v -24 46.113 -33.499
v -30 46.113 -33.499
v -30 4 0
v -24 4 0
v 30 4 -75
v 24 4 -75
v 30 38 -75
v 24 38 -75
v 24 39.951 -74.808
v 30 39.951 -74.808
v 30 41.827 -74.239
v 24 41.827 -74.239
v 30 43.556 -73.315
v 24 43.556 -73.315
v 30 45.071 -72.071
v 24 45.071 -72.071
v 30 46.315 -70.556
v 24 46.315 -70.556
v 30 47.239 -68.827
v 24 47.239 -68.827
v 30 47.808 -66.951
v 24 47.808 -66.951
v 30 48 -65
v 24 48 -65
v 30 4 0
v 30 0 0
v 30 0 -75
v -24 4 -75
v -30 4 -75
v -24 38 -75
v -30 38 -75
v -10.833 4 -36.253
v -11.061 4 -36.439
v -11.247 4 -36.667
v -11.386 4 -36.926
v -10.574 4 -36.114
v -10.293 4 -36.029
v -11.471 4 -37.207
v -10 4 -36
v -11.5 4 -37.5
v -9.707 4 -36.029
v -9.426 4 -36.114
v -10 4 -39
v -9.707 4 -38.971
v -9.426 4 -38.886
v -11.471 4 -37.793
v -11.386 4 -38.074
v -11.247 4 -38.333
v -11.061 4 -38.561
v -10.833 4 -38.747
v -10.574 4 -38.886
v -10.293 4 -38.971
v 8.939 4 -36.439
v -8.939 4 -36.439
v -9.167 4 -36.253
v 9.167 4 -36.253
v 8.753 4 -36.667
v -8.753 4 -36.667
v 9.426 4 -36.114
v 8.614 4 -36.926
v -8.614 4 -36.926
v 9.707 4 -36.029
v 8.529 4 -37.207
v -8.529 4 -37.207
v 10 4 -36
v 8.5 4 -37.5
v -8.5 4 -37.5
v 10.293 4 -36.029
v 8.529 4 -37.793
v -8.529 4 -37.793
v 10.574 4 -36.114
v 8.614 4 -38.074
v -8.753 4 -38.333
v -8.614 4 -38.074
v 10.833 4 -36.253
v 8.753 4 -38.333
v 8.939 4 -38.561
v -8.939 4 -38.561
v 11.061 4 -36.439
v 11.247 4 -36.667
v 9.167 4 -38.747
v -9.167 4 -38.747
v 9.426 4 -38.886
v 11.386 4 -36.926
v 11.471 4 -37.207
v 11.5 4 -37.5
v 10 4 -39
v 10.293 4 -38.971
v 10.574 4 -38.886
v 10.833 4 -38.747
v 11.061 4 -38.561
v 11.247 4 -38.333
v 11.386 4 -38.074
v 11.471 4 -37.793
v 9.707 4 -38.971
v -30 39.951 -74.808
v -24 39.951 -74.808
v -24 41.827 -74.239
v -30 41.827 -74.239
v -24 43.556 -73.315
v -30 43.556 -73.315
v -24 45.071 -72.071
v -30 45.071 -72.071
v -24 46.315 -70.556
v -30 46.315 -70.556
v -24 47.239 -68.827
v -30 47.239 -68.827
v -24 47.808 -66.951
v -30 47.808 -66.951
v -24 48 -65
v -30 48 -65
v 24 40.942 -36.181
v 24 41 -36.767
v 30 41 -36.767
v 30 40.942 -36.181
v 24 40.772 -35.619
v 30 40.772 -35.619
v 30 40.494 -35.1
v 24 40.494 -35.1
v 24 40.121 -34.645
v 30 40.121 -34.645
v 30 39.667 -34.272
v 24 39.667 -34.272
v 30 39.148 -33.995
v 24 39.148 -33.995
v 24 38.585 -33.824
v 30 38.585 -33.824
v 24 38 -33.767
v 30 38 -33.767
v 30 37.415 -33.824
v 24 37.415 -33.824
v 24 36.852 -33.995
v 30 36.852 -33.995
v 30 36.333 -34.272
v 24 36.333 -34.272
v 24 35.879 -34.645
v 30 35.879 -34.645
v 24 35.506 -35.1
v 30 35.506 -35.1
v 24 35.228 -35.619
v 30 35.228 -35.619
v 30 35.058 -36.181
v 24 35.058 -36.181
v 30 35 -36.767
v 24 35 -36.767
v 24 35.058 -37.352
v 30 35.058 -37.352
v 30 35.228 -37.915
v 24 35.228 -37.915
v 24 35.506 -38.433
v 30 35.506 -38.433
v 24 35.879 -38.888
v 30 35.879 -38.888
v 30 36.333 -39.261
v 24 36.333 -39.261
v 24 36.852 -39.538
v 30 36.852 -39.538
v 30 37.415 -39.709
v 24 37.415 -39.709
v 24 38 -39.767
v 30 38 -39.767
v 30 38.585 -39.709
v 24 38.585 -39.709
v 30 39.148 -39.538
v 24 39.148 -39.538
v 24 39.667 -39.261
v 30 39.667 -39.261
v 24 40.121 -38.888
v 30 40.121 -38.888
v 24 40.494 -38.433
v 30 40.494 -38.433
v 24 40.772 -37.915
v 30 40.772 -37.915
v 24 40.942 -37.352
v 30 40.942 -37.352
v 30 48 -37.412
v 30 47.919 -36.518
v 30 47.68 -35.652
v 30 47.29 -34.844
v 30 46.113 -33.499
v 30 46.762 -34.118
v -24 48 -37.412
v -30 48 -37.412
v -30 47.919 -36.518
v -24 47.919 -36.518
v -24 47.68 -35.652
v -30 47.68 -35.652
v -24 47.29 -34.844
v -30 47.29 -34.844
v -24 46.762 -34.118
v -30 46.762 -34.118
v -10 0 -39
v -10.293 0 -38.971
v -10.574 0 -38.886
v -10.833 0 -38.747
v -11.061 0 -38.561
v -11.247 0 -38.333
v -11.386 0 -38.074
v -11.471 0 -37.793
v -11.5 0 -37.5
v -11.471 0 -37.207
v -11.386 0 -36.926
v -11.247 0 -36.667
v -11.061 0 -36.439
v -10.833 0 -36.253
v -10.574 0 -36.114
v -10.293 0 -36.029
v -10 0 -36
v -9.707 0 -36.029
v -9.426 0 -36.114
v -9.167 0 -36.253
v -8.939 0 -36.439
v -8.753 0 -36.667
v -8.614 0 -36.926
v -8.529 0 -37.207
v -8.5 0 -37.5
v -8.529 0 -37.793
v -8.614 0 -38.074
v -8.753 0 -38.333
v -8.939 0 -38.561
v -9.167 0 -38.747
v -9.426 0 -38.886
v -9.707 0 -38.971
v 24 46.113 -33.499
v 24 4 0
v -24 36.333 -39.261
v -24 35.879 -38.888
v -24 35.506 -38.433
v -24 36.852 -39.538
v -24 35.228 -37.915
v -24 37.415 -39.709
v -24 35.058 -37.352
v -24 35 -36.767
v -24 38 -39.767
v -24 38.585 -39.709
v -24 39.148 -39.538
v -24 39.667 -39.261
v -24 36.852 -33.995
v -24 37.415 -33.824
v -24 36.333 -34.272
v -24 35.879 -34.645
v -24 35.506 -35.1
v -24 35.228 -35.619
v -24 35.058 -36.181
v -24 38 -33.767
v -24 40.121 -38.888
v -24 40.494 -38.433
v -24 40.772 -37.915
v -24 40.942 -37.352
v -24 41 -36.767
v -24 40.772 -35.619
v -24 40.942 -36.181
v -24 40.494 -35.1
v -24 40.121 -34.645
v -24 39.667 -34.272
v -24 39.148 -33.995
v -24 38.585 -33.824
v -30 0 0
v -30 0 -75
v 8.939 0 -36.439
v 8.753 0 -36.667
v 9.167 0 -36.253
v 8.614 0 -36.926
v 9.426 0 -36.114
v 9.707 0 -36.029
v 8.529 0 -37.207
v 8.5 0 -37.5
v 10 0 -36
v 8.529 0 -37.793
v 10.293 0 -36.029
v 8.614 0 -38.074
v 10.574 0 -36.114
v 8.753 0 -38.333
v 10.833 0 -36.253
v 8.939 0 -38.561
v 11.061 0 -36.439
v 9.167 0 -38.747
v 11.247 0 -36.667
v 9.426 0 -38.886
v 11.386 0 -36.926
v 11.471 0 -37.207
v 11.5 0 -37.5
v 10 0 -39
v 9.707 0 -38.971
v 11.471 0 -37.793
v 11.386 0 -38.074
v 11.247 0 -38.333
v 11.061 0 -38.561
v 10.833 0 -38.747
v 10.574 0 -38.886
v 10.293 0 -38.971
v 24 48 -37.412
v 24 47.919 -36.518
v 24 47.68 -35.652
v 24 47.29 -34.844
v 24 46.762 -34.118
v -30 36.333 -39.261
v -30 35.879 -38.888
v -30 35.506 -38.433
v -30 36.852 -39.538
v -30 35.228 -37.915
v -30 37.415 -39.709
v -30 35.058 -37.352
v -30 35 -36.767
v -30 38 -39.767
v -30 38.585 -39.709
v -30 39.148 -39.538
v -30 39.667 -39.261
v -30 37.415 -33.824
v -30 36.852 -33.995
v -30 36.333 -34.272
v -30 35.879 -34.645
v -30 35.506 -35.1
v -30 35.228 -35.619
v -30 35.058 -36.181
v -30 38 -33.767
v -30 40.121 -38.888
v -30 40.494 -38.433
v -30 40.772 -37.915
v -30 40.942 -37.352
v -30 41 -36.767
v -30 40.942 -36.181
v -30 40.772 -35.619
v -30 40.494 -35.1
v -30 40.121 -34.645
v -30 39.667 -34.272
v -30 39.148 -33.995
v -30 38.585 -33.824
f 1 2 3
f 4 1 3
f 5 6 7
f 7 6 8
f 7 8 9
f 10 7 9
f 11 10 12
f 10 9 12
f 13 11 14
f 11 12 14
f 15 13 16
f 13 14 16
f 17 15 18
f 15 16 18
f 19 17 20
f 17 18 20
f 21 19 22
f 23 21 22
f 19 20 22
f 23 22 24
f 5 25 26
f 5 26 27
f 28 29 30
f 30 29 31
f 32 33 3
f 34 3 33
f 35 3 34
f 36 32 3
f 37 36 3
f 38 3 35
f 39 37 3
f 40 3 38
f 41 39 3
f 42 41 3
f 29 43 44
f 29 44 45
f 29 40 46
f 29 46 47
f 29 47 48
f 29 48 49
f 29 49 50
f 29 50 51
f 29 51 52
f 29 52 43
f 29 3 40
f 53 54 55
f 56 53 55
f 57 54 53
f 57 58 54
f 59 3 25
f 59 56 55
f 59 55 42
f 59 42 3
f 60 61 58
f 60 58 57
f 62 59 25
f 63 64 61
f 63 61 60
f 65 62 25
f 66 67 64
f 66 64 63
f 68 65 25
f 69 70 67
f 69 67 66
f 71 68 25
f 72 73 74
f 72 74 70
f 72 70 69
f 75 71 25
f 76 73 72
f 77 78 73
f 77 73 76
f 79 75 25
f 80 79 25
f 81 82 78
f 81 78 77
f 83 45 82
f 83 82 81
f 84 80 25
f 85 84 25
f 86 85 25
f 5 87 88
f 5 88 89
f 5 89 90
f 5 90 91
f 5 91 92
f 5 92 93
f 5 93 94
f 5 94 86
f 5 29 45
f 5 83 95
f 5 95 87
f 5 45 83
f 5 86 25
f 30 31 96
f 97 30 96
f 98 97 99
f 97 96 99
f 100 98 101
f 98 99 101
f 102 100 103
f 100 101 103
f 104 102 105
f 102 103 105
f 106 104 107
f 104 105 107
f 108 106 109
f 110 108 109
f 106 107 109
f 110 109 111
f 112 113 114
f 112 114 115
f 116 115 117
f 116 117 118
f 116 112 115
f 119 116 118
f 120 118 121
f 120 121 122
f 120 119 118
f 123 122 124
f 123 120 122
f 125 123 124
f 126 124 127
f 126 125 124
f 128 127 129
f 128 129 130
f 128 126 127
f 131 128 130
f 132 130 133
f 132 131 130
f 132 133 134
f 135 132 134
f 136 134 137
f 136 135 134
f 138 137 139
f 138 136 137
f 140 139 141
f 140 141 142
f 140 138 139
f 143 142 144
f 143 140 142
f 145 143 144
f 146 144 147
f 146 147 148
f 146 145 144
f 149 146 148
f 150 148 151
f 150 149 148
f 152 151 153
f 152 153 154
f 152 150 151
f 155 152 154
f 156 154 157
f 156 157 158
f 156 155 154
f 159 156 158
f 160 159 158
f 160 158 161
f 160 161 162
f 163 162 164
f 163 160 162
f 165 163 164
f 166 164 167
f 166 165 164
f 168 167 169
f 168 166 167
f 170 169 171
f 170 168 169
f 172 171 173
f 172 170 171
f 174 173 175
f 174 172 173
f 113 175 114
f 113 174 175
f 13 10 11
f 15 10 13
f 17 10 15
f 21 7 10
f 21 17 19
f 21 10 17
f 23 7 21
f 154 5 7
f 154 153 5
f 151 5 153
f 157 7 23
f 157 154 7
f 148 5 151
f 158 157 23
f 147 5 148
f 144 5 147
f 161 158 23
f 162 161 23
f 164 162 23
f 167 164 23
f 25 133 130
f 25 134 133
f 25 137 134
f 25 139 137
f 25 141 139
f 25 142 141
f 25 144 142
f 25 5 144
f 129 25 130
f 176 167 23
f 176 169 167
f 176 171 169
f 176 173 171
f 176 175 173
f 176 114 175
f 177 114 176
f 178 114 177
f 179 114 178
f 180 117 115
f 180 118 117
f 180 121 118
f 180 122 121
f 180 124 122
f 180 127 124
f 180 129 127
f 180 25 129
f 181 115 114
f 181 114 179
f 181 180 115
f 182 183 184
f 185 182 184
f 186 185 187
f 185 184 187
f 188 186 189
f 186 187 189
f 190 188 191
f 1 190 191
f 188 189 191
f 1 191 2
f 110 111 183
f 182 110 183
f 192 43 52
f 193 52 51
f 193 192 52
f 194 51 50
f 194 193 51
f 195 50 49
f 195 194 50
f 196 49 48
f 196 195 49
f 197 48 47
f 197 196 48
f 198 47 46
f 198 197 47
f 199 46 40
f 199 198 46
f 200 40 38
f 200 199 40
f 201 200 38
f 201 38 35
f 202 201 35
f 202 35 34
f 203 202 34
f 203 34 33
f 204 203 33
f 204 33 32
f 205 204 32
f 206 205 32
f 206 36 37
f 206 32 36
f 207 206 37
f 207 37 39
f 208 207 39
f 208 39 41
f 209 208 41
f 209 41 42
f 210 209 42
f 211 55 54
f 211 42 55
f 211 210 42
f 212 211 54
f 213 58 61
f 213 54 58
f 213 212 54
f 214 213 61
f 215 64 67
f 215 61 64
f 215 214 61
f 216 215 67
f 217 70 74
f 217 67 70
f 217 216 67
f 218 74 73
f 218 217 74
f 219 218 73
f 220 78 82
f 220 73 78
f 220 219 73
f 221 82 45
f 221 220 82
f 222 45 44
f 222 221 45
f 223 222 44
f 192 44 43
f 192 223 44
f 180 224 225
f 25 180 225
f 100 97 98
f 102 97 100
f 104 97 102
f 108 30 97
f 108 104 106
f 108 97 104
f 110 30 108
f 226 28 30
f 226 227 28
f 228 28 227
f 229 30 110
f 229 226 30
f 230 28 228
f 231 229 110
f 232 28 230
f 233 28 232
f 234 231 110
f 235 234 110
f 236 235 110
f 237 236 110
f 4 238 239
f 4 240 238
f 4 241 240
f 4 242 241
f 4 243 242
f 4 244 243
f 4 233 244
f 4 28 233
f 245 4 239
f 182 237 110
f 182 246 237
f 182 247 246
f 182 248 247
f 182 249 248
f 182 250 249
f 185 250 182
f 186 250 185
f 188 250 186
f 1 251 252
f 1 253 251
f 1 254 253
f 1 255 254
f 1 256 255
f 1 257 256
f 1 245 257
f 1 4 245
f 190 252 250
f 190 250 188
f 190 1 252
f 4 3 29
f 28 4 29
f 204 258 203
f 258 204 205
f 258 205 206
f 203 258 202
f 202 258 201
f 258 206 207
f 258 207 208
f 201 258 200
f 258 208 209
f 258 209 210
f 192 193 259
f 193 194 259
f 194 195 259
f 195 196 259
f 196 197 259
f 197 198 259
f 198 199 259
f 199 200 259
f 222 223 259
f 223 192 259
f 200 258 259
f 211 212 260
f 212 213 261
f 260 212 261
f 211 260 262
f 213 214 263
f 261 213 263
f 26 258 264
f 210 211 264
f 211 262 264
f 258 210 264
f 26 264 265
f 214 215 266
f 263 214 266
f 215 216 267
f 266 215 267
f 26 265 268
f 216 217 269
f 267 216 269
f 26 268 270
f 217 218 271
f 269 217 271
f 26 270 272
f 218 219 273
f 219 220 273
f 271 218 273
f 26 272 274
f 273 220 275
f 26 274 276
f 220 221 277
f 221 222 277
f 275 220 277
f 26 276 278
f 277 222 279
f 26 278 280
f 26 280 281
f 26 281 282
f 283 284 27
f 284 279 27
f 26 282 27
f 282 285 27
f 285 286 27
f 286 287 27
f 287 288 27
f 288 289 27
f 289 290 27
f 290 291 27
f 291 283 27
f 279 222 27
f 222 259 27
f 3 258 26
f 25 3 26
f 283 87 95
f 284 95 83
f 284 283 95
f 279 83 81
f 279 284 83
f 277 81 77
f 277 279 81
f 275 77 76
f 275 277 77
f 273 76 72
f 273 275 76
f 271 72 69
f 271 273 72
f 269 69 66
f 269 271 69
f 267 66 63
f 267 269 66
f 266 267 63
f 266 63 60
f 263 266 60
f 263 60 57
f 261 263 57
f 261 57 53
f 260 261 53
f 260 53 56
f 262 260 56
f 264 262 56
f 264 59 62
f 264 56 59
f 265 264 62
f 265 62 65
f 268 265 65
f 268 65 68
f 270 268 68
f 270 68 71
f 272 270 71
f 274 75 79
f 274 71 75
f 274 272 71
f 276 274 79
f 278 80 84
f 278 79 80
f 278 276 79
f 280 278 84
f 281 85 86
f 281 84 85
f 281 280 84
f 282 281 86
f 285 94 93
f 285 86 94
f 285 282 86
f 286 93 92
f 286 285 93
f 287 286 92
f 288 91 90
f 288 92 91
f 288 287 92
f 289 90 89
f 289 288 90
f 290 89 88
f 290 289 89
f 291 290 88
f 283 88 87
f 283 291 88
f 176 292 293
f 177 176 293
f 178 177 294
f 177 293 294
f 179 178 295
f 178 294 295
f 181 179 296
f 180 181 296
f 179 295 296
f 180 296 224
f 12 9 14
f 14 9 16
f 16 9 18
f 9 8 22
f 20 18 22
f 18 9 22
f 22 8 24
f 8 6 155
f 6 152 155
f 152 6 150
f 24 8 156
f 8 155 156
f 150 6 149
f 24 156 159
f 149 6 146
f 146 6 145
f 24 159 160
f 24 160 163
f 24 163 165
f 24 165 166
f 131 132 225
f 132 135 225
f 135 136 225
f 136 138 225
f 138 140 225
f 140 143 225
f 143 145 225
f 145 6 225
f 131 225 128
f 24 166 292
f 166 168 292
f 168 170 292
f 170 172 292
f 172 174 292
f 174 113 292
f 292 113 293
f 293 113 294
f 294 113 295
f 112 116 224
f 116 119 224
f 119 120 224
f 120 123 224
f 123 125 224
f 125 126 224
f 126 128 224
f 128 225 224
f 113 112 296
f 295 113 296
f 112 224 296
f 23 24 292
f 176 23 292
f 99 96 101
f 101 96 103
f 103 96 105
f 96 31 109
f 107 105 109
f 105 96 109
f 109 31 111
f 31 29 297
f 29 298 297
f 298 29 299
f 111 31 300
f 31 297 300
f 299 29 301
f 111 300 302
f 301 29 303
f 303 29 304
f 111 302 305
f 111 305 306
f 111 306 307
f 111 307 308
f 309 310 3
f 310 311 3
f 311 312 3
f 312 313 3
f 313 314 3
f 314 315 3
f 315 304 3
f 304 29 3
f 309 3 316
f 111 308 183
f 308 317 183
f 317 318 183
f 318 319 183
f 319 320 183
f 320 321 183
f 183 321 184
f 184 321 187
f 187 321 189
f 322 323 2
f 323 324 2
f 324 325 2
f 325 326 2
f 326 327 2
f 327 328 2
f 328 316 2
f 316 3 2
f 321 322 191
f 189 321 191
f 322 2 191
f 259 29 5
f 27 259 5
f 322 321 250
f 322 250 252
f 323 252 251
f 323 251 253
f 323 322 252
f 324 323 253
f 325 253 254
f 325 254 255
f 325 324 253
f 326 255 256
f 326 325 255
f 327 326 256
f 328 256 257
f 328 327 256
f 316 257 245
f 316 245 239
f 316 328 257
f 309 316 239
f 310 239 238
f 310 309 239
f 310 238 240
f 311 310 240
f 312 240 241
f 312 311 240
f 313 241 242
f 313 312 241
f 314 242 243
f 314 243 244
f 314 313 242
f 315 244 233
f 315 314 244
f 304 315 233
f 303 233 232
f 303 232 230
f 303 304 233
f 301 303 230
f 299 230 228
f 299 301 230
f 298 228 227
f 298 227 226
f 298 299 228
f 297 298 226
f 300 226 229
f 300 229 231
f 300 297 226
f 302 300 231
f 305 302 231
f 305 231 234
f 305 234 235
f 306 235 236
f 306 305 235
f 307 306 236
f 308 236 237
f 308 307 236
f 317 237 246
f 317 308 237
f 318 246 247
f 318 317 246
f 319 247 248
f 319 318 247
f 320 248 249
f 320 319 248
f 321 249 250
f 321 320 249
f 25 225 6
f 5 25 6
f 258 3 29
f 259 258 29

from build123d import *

# Parameters (mm, degrees)
SKETCH1_W               = 60
SKETCH1_H               = 75
BOSS_EXTRUDE1_DEPTH     = 4
CUT_EXTRUDE1_DEPTH      = 81.876448982
CUT_EXTRUDE1_DEPTH_BACK = 4
SKETCH2_R               = 1.5
SKETCH8_R               = 3
CUT_EXTRUDE2_DEPTH      = 74
FILLET3_R               = 5
FILLET4_R               = 10
SPLIT1_START            = 4
SPLIT1_OUTLINE_W        = 6
SPLIT1_OUTLINE_H        = 76
SPLIT1_DEPTH            = 44
SPLIT1_START_2          = -30
SPLIT1_2_OUTLINE_R      = 3
SPLIT1_2_DEPTH          = 6
SPLIT1_START_3          = 24
SPLIT1_3_OUTLINE_R      = 3
SPLIT1_3_DEPTH          = 6


# Read off the part's stored shape, not the designer's step: Split1
with BuildPart() as part:
    # Sketch1 → Boss-Extrude1 (new body)
    with BuildSketch(Plane(origin=(0, 0, 0), x_dir=(1, 0, 0), z_dir=(0, 1, 0))):
        with Locations((0, 37.5)):
            Rectangle(SKETCH1_W, SKETCH1_H)
    extrude(amount=BOSS_EXTRUDE1_DEPTH)

    # Sketch2 → Cut-Extrude1 (cut, two sides: drawn at the far end of the back side and taken through both)
    with BuildSketch(Plane(origin=(0, 4, 0), x_dir=(1, 0, 0), z_dir=(0, 1, 0)).offset(-CUT_EXTRUDE1_DEPTH_BACK)):
        with Locations(Location((-10, 37.5, 0), (0, 0, 90))):
            Circle(SKETCH2_R)
        with Locations(Location((10, 37.5, 0), (0, 0, 90))):
            Circle(SKETCH2_R)
    extrude(amount=CUT_EXTRUDE1_DEPTH + CUT_EXTRUDE1_DEPTH_BACK, mode=Mode.SUBTRACT)

    # Sketch3 → Loft1 section 0
    with BuildSketch(Plane(origin=(0, 4, 0), x_dir=(1, 0, 0), z_dir=(0, 1, 0))):
        with BuildLine():
            Line((30, 75), (24, 75))
            Line((24, 75), (24, 0))
            Line((24, 0), (30, 0))
            Line((30, 0), (30, 75))
        make_face()
    # Sketch4 → Loft1 section 1
    with BuildSketch(Plane(origin=(0, 48, 0), x_dir=(1, 0, 0), z_dir=(0, 1, 0))):
        with BuildLine():
            Line((24, 75), (24, 35))
            Line((24, 35), (30, 35))
            Line((30, 35), (30, 75))
            Line((30, 75), (24, 75))
        make_face()
    loft()

    # Sketch3<19> → Loft2 section 0
    with BuildSketch(Plane(origin=(0, 4, 0), x_dir=(1, 0, 0), z_dir=(0, 1, 0))):
        with BuildLine():
            Line((-30, 75), (-24, 75))
            Line((-24, 75), (-24, 0))
            Line((-24, 0), (-30, 0))
            Line((-30, 0), (-30, 75))
        make_face()
    # Sketch4<17> → Loft2 section 1
    with BuildSketch(Plane(origin=(0, 48, 0), x_dir=(1, 0, 0), z_dir=(0, 1, 0))):
        with BuildLine():
            Line((-24, 75), (-24, 35))
            Line((-24, 35), (-30, 35))
            Line((-30, 35), (-30, 75))
            Line((-30, 75), (-24, 75))
        make_face()
    loft()

    # Sketch8 → Cut-Extrude2 (cut)
    with BuildSketch(Plane.ZY.offset(30)):
        with Locations((-36.766552642, 38)):
            Circle(SKETCH8_R)
    extrude(amount=-CUT_EXTRUDE2_DEPTH, mode=Mode.SUBTRACT)

    # Fillet3
    fillet3_edges = [part.edges().sort_by_distance(p)[0] for p in [
        (27, 48, -35),
        (-27, 48, -35),
    ]]
    fillet(fillet3_edges, radius=FILLET3_R)

    # Fillet4
    fillet4_edges = [part.edges().sort_by_distance(p)[0] for p in [
        (-27, 48, -75),
        (27, 48, -75),
    ]]
    fillet(fillet4_edges, radius=FILLET4_R)

    # Split1 outline → Split1 (cut)
    with BuildSketch(Plane(origin=(0, 0, 0), x_dir=(1, 0, 0), z_dir=(0, 1, 0)).offset(SPLIT1_START)):
        with Locations((-27, 37)):
            Rectangle(SPLIT1_OUTLINE_W, SPLIT1_OUTLINE_H)
        with Locations((27, 37)):
            Rectangle(SPLIT1_OUTLINE_W, SPLIT1_OUTLINE_H)
    extrude(amount=SPLIT1_DEPTH, mode=Mode.SUBTRACT)


with BuildPart() as body_2:
    # Split1 2 outline → Split1 2 (new body)
    with BuildSketch(Plane.YZ.offset(SPLIT1_START_2)):
        with BuildLine():
            Line((4, 0), (4, -75))
            Line((4, -75), (38, -75))
            ThreePointArc((38, -75), (45.071067812, -72.071067812), (48, -65))
            Line((48, -65), (48, -37.411678544))
            ThreePointArc((48, -37.411678544), (47.503503589, -35.239477948), (46.112617829, -33.498673273))
            Line((46.112617829, -33.498673273), (4, 0))
        make_face()
        with Locations((38, -36.766552642)):
            Circle(SPLIT1_2_OUTLINE_R, mode=Mode.SUBTRACT)
    extrude(amount=SPLIT1_2_DEPTH)


with BuildPart() as body_3:
    # Split1 3 outline → Split1 3 (new body)
    with BuildSketch(Plane.YZ.offset(SPLIT1_START_3)):
        with BuildLine():
            Line((4, 0), (4, -75))
            Line((4, -75), (38, -75))
            ThreePointArc((38, -75), (45.071067812, -72.071067812), (48, -65))
            Line((48, -65), (48, -37.411678544))
            ThreePointArc((48, -37.411678544), (47.503503589, -35.239477948), (46.112617829, -33.498673273))
            Line((46.112617829, -33.498673273), (4, 0))
        make_face()
        with Locations((38, -36.766552642)):
            Circle(SPLIT1_3_OUTLINE_R, mode=Mode.SUBTRACT)
    extrude(amount=SPLIT1_3_DEPTH)


solid = Compound([part.part, body_2.part, body_3.part])
